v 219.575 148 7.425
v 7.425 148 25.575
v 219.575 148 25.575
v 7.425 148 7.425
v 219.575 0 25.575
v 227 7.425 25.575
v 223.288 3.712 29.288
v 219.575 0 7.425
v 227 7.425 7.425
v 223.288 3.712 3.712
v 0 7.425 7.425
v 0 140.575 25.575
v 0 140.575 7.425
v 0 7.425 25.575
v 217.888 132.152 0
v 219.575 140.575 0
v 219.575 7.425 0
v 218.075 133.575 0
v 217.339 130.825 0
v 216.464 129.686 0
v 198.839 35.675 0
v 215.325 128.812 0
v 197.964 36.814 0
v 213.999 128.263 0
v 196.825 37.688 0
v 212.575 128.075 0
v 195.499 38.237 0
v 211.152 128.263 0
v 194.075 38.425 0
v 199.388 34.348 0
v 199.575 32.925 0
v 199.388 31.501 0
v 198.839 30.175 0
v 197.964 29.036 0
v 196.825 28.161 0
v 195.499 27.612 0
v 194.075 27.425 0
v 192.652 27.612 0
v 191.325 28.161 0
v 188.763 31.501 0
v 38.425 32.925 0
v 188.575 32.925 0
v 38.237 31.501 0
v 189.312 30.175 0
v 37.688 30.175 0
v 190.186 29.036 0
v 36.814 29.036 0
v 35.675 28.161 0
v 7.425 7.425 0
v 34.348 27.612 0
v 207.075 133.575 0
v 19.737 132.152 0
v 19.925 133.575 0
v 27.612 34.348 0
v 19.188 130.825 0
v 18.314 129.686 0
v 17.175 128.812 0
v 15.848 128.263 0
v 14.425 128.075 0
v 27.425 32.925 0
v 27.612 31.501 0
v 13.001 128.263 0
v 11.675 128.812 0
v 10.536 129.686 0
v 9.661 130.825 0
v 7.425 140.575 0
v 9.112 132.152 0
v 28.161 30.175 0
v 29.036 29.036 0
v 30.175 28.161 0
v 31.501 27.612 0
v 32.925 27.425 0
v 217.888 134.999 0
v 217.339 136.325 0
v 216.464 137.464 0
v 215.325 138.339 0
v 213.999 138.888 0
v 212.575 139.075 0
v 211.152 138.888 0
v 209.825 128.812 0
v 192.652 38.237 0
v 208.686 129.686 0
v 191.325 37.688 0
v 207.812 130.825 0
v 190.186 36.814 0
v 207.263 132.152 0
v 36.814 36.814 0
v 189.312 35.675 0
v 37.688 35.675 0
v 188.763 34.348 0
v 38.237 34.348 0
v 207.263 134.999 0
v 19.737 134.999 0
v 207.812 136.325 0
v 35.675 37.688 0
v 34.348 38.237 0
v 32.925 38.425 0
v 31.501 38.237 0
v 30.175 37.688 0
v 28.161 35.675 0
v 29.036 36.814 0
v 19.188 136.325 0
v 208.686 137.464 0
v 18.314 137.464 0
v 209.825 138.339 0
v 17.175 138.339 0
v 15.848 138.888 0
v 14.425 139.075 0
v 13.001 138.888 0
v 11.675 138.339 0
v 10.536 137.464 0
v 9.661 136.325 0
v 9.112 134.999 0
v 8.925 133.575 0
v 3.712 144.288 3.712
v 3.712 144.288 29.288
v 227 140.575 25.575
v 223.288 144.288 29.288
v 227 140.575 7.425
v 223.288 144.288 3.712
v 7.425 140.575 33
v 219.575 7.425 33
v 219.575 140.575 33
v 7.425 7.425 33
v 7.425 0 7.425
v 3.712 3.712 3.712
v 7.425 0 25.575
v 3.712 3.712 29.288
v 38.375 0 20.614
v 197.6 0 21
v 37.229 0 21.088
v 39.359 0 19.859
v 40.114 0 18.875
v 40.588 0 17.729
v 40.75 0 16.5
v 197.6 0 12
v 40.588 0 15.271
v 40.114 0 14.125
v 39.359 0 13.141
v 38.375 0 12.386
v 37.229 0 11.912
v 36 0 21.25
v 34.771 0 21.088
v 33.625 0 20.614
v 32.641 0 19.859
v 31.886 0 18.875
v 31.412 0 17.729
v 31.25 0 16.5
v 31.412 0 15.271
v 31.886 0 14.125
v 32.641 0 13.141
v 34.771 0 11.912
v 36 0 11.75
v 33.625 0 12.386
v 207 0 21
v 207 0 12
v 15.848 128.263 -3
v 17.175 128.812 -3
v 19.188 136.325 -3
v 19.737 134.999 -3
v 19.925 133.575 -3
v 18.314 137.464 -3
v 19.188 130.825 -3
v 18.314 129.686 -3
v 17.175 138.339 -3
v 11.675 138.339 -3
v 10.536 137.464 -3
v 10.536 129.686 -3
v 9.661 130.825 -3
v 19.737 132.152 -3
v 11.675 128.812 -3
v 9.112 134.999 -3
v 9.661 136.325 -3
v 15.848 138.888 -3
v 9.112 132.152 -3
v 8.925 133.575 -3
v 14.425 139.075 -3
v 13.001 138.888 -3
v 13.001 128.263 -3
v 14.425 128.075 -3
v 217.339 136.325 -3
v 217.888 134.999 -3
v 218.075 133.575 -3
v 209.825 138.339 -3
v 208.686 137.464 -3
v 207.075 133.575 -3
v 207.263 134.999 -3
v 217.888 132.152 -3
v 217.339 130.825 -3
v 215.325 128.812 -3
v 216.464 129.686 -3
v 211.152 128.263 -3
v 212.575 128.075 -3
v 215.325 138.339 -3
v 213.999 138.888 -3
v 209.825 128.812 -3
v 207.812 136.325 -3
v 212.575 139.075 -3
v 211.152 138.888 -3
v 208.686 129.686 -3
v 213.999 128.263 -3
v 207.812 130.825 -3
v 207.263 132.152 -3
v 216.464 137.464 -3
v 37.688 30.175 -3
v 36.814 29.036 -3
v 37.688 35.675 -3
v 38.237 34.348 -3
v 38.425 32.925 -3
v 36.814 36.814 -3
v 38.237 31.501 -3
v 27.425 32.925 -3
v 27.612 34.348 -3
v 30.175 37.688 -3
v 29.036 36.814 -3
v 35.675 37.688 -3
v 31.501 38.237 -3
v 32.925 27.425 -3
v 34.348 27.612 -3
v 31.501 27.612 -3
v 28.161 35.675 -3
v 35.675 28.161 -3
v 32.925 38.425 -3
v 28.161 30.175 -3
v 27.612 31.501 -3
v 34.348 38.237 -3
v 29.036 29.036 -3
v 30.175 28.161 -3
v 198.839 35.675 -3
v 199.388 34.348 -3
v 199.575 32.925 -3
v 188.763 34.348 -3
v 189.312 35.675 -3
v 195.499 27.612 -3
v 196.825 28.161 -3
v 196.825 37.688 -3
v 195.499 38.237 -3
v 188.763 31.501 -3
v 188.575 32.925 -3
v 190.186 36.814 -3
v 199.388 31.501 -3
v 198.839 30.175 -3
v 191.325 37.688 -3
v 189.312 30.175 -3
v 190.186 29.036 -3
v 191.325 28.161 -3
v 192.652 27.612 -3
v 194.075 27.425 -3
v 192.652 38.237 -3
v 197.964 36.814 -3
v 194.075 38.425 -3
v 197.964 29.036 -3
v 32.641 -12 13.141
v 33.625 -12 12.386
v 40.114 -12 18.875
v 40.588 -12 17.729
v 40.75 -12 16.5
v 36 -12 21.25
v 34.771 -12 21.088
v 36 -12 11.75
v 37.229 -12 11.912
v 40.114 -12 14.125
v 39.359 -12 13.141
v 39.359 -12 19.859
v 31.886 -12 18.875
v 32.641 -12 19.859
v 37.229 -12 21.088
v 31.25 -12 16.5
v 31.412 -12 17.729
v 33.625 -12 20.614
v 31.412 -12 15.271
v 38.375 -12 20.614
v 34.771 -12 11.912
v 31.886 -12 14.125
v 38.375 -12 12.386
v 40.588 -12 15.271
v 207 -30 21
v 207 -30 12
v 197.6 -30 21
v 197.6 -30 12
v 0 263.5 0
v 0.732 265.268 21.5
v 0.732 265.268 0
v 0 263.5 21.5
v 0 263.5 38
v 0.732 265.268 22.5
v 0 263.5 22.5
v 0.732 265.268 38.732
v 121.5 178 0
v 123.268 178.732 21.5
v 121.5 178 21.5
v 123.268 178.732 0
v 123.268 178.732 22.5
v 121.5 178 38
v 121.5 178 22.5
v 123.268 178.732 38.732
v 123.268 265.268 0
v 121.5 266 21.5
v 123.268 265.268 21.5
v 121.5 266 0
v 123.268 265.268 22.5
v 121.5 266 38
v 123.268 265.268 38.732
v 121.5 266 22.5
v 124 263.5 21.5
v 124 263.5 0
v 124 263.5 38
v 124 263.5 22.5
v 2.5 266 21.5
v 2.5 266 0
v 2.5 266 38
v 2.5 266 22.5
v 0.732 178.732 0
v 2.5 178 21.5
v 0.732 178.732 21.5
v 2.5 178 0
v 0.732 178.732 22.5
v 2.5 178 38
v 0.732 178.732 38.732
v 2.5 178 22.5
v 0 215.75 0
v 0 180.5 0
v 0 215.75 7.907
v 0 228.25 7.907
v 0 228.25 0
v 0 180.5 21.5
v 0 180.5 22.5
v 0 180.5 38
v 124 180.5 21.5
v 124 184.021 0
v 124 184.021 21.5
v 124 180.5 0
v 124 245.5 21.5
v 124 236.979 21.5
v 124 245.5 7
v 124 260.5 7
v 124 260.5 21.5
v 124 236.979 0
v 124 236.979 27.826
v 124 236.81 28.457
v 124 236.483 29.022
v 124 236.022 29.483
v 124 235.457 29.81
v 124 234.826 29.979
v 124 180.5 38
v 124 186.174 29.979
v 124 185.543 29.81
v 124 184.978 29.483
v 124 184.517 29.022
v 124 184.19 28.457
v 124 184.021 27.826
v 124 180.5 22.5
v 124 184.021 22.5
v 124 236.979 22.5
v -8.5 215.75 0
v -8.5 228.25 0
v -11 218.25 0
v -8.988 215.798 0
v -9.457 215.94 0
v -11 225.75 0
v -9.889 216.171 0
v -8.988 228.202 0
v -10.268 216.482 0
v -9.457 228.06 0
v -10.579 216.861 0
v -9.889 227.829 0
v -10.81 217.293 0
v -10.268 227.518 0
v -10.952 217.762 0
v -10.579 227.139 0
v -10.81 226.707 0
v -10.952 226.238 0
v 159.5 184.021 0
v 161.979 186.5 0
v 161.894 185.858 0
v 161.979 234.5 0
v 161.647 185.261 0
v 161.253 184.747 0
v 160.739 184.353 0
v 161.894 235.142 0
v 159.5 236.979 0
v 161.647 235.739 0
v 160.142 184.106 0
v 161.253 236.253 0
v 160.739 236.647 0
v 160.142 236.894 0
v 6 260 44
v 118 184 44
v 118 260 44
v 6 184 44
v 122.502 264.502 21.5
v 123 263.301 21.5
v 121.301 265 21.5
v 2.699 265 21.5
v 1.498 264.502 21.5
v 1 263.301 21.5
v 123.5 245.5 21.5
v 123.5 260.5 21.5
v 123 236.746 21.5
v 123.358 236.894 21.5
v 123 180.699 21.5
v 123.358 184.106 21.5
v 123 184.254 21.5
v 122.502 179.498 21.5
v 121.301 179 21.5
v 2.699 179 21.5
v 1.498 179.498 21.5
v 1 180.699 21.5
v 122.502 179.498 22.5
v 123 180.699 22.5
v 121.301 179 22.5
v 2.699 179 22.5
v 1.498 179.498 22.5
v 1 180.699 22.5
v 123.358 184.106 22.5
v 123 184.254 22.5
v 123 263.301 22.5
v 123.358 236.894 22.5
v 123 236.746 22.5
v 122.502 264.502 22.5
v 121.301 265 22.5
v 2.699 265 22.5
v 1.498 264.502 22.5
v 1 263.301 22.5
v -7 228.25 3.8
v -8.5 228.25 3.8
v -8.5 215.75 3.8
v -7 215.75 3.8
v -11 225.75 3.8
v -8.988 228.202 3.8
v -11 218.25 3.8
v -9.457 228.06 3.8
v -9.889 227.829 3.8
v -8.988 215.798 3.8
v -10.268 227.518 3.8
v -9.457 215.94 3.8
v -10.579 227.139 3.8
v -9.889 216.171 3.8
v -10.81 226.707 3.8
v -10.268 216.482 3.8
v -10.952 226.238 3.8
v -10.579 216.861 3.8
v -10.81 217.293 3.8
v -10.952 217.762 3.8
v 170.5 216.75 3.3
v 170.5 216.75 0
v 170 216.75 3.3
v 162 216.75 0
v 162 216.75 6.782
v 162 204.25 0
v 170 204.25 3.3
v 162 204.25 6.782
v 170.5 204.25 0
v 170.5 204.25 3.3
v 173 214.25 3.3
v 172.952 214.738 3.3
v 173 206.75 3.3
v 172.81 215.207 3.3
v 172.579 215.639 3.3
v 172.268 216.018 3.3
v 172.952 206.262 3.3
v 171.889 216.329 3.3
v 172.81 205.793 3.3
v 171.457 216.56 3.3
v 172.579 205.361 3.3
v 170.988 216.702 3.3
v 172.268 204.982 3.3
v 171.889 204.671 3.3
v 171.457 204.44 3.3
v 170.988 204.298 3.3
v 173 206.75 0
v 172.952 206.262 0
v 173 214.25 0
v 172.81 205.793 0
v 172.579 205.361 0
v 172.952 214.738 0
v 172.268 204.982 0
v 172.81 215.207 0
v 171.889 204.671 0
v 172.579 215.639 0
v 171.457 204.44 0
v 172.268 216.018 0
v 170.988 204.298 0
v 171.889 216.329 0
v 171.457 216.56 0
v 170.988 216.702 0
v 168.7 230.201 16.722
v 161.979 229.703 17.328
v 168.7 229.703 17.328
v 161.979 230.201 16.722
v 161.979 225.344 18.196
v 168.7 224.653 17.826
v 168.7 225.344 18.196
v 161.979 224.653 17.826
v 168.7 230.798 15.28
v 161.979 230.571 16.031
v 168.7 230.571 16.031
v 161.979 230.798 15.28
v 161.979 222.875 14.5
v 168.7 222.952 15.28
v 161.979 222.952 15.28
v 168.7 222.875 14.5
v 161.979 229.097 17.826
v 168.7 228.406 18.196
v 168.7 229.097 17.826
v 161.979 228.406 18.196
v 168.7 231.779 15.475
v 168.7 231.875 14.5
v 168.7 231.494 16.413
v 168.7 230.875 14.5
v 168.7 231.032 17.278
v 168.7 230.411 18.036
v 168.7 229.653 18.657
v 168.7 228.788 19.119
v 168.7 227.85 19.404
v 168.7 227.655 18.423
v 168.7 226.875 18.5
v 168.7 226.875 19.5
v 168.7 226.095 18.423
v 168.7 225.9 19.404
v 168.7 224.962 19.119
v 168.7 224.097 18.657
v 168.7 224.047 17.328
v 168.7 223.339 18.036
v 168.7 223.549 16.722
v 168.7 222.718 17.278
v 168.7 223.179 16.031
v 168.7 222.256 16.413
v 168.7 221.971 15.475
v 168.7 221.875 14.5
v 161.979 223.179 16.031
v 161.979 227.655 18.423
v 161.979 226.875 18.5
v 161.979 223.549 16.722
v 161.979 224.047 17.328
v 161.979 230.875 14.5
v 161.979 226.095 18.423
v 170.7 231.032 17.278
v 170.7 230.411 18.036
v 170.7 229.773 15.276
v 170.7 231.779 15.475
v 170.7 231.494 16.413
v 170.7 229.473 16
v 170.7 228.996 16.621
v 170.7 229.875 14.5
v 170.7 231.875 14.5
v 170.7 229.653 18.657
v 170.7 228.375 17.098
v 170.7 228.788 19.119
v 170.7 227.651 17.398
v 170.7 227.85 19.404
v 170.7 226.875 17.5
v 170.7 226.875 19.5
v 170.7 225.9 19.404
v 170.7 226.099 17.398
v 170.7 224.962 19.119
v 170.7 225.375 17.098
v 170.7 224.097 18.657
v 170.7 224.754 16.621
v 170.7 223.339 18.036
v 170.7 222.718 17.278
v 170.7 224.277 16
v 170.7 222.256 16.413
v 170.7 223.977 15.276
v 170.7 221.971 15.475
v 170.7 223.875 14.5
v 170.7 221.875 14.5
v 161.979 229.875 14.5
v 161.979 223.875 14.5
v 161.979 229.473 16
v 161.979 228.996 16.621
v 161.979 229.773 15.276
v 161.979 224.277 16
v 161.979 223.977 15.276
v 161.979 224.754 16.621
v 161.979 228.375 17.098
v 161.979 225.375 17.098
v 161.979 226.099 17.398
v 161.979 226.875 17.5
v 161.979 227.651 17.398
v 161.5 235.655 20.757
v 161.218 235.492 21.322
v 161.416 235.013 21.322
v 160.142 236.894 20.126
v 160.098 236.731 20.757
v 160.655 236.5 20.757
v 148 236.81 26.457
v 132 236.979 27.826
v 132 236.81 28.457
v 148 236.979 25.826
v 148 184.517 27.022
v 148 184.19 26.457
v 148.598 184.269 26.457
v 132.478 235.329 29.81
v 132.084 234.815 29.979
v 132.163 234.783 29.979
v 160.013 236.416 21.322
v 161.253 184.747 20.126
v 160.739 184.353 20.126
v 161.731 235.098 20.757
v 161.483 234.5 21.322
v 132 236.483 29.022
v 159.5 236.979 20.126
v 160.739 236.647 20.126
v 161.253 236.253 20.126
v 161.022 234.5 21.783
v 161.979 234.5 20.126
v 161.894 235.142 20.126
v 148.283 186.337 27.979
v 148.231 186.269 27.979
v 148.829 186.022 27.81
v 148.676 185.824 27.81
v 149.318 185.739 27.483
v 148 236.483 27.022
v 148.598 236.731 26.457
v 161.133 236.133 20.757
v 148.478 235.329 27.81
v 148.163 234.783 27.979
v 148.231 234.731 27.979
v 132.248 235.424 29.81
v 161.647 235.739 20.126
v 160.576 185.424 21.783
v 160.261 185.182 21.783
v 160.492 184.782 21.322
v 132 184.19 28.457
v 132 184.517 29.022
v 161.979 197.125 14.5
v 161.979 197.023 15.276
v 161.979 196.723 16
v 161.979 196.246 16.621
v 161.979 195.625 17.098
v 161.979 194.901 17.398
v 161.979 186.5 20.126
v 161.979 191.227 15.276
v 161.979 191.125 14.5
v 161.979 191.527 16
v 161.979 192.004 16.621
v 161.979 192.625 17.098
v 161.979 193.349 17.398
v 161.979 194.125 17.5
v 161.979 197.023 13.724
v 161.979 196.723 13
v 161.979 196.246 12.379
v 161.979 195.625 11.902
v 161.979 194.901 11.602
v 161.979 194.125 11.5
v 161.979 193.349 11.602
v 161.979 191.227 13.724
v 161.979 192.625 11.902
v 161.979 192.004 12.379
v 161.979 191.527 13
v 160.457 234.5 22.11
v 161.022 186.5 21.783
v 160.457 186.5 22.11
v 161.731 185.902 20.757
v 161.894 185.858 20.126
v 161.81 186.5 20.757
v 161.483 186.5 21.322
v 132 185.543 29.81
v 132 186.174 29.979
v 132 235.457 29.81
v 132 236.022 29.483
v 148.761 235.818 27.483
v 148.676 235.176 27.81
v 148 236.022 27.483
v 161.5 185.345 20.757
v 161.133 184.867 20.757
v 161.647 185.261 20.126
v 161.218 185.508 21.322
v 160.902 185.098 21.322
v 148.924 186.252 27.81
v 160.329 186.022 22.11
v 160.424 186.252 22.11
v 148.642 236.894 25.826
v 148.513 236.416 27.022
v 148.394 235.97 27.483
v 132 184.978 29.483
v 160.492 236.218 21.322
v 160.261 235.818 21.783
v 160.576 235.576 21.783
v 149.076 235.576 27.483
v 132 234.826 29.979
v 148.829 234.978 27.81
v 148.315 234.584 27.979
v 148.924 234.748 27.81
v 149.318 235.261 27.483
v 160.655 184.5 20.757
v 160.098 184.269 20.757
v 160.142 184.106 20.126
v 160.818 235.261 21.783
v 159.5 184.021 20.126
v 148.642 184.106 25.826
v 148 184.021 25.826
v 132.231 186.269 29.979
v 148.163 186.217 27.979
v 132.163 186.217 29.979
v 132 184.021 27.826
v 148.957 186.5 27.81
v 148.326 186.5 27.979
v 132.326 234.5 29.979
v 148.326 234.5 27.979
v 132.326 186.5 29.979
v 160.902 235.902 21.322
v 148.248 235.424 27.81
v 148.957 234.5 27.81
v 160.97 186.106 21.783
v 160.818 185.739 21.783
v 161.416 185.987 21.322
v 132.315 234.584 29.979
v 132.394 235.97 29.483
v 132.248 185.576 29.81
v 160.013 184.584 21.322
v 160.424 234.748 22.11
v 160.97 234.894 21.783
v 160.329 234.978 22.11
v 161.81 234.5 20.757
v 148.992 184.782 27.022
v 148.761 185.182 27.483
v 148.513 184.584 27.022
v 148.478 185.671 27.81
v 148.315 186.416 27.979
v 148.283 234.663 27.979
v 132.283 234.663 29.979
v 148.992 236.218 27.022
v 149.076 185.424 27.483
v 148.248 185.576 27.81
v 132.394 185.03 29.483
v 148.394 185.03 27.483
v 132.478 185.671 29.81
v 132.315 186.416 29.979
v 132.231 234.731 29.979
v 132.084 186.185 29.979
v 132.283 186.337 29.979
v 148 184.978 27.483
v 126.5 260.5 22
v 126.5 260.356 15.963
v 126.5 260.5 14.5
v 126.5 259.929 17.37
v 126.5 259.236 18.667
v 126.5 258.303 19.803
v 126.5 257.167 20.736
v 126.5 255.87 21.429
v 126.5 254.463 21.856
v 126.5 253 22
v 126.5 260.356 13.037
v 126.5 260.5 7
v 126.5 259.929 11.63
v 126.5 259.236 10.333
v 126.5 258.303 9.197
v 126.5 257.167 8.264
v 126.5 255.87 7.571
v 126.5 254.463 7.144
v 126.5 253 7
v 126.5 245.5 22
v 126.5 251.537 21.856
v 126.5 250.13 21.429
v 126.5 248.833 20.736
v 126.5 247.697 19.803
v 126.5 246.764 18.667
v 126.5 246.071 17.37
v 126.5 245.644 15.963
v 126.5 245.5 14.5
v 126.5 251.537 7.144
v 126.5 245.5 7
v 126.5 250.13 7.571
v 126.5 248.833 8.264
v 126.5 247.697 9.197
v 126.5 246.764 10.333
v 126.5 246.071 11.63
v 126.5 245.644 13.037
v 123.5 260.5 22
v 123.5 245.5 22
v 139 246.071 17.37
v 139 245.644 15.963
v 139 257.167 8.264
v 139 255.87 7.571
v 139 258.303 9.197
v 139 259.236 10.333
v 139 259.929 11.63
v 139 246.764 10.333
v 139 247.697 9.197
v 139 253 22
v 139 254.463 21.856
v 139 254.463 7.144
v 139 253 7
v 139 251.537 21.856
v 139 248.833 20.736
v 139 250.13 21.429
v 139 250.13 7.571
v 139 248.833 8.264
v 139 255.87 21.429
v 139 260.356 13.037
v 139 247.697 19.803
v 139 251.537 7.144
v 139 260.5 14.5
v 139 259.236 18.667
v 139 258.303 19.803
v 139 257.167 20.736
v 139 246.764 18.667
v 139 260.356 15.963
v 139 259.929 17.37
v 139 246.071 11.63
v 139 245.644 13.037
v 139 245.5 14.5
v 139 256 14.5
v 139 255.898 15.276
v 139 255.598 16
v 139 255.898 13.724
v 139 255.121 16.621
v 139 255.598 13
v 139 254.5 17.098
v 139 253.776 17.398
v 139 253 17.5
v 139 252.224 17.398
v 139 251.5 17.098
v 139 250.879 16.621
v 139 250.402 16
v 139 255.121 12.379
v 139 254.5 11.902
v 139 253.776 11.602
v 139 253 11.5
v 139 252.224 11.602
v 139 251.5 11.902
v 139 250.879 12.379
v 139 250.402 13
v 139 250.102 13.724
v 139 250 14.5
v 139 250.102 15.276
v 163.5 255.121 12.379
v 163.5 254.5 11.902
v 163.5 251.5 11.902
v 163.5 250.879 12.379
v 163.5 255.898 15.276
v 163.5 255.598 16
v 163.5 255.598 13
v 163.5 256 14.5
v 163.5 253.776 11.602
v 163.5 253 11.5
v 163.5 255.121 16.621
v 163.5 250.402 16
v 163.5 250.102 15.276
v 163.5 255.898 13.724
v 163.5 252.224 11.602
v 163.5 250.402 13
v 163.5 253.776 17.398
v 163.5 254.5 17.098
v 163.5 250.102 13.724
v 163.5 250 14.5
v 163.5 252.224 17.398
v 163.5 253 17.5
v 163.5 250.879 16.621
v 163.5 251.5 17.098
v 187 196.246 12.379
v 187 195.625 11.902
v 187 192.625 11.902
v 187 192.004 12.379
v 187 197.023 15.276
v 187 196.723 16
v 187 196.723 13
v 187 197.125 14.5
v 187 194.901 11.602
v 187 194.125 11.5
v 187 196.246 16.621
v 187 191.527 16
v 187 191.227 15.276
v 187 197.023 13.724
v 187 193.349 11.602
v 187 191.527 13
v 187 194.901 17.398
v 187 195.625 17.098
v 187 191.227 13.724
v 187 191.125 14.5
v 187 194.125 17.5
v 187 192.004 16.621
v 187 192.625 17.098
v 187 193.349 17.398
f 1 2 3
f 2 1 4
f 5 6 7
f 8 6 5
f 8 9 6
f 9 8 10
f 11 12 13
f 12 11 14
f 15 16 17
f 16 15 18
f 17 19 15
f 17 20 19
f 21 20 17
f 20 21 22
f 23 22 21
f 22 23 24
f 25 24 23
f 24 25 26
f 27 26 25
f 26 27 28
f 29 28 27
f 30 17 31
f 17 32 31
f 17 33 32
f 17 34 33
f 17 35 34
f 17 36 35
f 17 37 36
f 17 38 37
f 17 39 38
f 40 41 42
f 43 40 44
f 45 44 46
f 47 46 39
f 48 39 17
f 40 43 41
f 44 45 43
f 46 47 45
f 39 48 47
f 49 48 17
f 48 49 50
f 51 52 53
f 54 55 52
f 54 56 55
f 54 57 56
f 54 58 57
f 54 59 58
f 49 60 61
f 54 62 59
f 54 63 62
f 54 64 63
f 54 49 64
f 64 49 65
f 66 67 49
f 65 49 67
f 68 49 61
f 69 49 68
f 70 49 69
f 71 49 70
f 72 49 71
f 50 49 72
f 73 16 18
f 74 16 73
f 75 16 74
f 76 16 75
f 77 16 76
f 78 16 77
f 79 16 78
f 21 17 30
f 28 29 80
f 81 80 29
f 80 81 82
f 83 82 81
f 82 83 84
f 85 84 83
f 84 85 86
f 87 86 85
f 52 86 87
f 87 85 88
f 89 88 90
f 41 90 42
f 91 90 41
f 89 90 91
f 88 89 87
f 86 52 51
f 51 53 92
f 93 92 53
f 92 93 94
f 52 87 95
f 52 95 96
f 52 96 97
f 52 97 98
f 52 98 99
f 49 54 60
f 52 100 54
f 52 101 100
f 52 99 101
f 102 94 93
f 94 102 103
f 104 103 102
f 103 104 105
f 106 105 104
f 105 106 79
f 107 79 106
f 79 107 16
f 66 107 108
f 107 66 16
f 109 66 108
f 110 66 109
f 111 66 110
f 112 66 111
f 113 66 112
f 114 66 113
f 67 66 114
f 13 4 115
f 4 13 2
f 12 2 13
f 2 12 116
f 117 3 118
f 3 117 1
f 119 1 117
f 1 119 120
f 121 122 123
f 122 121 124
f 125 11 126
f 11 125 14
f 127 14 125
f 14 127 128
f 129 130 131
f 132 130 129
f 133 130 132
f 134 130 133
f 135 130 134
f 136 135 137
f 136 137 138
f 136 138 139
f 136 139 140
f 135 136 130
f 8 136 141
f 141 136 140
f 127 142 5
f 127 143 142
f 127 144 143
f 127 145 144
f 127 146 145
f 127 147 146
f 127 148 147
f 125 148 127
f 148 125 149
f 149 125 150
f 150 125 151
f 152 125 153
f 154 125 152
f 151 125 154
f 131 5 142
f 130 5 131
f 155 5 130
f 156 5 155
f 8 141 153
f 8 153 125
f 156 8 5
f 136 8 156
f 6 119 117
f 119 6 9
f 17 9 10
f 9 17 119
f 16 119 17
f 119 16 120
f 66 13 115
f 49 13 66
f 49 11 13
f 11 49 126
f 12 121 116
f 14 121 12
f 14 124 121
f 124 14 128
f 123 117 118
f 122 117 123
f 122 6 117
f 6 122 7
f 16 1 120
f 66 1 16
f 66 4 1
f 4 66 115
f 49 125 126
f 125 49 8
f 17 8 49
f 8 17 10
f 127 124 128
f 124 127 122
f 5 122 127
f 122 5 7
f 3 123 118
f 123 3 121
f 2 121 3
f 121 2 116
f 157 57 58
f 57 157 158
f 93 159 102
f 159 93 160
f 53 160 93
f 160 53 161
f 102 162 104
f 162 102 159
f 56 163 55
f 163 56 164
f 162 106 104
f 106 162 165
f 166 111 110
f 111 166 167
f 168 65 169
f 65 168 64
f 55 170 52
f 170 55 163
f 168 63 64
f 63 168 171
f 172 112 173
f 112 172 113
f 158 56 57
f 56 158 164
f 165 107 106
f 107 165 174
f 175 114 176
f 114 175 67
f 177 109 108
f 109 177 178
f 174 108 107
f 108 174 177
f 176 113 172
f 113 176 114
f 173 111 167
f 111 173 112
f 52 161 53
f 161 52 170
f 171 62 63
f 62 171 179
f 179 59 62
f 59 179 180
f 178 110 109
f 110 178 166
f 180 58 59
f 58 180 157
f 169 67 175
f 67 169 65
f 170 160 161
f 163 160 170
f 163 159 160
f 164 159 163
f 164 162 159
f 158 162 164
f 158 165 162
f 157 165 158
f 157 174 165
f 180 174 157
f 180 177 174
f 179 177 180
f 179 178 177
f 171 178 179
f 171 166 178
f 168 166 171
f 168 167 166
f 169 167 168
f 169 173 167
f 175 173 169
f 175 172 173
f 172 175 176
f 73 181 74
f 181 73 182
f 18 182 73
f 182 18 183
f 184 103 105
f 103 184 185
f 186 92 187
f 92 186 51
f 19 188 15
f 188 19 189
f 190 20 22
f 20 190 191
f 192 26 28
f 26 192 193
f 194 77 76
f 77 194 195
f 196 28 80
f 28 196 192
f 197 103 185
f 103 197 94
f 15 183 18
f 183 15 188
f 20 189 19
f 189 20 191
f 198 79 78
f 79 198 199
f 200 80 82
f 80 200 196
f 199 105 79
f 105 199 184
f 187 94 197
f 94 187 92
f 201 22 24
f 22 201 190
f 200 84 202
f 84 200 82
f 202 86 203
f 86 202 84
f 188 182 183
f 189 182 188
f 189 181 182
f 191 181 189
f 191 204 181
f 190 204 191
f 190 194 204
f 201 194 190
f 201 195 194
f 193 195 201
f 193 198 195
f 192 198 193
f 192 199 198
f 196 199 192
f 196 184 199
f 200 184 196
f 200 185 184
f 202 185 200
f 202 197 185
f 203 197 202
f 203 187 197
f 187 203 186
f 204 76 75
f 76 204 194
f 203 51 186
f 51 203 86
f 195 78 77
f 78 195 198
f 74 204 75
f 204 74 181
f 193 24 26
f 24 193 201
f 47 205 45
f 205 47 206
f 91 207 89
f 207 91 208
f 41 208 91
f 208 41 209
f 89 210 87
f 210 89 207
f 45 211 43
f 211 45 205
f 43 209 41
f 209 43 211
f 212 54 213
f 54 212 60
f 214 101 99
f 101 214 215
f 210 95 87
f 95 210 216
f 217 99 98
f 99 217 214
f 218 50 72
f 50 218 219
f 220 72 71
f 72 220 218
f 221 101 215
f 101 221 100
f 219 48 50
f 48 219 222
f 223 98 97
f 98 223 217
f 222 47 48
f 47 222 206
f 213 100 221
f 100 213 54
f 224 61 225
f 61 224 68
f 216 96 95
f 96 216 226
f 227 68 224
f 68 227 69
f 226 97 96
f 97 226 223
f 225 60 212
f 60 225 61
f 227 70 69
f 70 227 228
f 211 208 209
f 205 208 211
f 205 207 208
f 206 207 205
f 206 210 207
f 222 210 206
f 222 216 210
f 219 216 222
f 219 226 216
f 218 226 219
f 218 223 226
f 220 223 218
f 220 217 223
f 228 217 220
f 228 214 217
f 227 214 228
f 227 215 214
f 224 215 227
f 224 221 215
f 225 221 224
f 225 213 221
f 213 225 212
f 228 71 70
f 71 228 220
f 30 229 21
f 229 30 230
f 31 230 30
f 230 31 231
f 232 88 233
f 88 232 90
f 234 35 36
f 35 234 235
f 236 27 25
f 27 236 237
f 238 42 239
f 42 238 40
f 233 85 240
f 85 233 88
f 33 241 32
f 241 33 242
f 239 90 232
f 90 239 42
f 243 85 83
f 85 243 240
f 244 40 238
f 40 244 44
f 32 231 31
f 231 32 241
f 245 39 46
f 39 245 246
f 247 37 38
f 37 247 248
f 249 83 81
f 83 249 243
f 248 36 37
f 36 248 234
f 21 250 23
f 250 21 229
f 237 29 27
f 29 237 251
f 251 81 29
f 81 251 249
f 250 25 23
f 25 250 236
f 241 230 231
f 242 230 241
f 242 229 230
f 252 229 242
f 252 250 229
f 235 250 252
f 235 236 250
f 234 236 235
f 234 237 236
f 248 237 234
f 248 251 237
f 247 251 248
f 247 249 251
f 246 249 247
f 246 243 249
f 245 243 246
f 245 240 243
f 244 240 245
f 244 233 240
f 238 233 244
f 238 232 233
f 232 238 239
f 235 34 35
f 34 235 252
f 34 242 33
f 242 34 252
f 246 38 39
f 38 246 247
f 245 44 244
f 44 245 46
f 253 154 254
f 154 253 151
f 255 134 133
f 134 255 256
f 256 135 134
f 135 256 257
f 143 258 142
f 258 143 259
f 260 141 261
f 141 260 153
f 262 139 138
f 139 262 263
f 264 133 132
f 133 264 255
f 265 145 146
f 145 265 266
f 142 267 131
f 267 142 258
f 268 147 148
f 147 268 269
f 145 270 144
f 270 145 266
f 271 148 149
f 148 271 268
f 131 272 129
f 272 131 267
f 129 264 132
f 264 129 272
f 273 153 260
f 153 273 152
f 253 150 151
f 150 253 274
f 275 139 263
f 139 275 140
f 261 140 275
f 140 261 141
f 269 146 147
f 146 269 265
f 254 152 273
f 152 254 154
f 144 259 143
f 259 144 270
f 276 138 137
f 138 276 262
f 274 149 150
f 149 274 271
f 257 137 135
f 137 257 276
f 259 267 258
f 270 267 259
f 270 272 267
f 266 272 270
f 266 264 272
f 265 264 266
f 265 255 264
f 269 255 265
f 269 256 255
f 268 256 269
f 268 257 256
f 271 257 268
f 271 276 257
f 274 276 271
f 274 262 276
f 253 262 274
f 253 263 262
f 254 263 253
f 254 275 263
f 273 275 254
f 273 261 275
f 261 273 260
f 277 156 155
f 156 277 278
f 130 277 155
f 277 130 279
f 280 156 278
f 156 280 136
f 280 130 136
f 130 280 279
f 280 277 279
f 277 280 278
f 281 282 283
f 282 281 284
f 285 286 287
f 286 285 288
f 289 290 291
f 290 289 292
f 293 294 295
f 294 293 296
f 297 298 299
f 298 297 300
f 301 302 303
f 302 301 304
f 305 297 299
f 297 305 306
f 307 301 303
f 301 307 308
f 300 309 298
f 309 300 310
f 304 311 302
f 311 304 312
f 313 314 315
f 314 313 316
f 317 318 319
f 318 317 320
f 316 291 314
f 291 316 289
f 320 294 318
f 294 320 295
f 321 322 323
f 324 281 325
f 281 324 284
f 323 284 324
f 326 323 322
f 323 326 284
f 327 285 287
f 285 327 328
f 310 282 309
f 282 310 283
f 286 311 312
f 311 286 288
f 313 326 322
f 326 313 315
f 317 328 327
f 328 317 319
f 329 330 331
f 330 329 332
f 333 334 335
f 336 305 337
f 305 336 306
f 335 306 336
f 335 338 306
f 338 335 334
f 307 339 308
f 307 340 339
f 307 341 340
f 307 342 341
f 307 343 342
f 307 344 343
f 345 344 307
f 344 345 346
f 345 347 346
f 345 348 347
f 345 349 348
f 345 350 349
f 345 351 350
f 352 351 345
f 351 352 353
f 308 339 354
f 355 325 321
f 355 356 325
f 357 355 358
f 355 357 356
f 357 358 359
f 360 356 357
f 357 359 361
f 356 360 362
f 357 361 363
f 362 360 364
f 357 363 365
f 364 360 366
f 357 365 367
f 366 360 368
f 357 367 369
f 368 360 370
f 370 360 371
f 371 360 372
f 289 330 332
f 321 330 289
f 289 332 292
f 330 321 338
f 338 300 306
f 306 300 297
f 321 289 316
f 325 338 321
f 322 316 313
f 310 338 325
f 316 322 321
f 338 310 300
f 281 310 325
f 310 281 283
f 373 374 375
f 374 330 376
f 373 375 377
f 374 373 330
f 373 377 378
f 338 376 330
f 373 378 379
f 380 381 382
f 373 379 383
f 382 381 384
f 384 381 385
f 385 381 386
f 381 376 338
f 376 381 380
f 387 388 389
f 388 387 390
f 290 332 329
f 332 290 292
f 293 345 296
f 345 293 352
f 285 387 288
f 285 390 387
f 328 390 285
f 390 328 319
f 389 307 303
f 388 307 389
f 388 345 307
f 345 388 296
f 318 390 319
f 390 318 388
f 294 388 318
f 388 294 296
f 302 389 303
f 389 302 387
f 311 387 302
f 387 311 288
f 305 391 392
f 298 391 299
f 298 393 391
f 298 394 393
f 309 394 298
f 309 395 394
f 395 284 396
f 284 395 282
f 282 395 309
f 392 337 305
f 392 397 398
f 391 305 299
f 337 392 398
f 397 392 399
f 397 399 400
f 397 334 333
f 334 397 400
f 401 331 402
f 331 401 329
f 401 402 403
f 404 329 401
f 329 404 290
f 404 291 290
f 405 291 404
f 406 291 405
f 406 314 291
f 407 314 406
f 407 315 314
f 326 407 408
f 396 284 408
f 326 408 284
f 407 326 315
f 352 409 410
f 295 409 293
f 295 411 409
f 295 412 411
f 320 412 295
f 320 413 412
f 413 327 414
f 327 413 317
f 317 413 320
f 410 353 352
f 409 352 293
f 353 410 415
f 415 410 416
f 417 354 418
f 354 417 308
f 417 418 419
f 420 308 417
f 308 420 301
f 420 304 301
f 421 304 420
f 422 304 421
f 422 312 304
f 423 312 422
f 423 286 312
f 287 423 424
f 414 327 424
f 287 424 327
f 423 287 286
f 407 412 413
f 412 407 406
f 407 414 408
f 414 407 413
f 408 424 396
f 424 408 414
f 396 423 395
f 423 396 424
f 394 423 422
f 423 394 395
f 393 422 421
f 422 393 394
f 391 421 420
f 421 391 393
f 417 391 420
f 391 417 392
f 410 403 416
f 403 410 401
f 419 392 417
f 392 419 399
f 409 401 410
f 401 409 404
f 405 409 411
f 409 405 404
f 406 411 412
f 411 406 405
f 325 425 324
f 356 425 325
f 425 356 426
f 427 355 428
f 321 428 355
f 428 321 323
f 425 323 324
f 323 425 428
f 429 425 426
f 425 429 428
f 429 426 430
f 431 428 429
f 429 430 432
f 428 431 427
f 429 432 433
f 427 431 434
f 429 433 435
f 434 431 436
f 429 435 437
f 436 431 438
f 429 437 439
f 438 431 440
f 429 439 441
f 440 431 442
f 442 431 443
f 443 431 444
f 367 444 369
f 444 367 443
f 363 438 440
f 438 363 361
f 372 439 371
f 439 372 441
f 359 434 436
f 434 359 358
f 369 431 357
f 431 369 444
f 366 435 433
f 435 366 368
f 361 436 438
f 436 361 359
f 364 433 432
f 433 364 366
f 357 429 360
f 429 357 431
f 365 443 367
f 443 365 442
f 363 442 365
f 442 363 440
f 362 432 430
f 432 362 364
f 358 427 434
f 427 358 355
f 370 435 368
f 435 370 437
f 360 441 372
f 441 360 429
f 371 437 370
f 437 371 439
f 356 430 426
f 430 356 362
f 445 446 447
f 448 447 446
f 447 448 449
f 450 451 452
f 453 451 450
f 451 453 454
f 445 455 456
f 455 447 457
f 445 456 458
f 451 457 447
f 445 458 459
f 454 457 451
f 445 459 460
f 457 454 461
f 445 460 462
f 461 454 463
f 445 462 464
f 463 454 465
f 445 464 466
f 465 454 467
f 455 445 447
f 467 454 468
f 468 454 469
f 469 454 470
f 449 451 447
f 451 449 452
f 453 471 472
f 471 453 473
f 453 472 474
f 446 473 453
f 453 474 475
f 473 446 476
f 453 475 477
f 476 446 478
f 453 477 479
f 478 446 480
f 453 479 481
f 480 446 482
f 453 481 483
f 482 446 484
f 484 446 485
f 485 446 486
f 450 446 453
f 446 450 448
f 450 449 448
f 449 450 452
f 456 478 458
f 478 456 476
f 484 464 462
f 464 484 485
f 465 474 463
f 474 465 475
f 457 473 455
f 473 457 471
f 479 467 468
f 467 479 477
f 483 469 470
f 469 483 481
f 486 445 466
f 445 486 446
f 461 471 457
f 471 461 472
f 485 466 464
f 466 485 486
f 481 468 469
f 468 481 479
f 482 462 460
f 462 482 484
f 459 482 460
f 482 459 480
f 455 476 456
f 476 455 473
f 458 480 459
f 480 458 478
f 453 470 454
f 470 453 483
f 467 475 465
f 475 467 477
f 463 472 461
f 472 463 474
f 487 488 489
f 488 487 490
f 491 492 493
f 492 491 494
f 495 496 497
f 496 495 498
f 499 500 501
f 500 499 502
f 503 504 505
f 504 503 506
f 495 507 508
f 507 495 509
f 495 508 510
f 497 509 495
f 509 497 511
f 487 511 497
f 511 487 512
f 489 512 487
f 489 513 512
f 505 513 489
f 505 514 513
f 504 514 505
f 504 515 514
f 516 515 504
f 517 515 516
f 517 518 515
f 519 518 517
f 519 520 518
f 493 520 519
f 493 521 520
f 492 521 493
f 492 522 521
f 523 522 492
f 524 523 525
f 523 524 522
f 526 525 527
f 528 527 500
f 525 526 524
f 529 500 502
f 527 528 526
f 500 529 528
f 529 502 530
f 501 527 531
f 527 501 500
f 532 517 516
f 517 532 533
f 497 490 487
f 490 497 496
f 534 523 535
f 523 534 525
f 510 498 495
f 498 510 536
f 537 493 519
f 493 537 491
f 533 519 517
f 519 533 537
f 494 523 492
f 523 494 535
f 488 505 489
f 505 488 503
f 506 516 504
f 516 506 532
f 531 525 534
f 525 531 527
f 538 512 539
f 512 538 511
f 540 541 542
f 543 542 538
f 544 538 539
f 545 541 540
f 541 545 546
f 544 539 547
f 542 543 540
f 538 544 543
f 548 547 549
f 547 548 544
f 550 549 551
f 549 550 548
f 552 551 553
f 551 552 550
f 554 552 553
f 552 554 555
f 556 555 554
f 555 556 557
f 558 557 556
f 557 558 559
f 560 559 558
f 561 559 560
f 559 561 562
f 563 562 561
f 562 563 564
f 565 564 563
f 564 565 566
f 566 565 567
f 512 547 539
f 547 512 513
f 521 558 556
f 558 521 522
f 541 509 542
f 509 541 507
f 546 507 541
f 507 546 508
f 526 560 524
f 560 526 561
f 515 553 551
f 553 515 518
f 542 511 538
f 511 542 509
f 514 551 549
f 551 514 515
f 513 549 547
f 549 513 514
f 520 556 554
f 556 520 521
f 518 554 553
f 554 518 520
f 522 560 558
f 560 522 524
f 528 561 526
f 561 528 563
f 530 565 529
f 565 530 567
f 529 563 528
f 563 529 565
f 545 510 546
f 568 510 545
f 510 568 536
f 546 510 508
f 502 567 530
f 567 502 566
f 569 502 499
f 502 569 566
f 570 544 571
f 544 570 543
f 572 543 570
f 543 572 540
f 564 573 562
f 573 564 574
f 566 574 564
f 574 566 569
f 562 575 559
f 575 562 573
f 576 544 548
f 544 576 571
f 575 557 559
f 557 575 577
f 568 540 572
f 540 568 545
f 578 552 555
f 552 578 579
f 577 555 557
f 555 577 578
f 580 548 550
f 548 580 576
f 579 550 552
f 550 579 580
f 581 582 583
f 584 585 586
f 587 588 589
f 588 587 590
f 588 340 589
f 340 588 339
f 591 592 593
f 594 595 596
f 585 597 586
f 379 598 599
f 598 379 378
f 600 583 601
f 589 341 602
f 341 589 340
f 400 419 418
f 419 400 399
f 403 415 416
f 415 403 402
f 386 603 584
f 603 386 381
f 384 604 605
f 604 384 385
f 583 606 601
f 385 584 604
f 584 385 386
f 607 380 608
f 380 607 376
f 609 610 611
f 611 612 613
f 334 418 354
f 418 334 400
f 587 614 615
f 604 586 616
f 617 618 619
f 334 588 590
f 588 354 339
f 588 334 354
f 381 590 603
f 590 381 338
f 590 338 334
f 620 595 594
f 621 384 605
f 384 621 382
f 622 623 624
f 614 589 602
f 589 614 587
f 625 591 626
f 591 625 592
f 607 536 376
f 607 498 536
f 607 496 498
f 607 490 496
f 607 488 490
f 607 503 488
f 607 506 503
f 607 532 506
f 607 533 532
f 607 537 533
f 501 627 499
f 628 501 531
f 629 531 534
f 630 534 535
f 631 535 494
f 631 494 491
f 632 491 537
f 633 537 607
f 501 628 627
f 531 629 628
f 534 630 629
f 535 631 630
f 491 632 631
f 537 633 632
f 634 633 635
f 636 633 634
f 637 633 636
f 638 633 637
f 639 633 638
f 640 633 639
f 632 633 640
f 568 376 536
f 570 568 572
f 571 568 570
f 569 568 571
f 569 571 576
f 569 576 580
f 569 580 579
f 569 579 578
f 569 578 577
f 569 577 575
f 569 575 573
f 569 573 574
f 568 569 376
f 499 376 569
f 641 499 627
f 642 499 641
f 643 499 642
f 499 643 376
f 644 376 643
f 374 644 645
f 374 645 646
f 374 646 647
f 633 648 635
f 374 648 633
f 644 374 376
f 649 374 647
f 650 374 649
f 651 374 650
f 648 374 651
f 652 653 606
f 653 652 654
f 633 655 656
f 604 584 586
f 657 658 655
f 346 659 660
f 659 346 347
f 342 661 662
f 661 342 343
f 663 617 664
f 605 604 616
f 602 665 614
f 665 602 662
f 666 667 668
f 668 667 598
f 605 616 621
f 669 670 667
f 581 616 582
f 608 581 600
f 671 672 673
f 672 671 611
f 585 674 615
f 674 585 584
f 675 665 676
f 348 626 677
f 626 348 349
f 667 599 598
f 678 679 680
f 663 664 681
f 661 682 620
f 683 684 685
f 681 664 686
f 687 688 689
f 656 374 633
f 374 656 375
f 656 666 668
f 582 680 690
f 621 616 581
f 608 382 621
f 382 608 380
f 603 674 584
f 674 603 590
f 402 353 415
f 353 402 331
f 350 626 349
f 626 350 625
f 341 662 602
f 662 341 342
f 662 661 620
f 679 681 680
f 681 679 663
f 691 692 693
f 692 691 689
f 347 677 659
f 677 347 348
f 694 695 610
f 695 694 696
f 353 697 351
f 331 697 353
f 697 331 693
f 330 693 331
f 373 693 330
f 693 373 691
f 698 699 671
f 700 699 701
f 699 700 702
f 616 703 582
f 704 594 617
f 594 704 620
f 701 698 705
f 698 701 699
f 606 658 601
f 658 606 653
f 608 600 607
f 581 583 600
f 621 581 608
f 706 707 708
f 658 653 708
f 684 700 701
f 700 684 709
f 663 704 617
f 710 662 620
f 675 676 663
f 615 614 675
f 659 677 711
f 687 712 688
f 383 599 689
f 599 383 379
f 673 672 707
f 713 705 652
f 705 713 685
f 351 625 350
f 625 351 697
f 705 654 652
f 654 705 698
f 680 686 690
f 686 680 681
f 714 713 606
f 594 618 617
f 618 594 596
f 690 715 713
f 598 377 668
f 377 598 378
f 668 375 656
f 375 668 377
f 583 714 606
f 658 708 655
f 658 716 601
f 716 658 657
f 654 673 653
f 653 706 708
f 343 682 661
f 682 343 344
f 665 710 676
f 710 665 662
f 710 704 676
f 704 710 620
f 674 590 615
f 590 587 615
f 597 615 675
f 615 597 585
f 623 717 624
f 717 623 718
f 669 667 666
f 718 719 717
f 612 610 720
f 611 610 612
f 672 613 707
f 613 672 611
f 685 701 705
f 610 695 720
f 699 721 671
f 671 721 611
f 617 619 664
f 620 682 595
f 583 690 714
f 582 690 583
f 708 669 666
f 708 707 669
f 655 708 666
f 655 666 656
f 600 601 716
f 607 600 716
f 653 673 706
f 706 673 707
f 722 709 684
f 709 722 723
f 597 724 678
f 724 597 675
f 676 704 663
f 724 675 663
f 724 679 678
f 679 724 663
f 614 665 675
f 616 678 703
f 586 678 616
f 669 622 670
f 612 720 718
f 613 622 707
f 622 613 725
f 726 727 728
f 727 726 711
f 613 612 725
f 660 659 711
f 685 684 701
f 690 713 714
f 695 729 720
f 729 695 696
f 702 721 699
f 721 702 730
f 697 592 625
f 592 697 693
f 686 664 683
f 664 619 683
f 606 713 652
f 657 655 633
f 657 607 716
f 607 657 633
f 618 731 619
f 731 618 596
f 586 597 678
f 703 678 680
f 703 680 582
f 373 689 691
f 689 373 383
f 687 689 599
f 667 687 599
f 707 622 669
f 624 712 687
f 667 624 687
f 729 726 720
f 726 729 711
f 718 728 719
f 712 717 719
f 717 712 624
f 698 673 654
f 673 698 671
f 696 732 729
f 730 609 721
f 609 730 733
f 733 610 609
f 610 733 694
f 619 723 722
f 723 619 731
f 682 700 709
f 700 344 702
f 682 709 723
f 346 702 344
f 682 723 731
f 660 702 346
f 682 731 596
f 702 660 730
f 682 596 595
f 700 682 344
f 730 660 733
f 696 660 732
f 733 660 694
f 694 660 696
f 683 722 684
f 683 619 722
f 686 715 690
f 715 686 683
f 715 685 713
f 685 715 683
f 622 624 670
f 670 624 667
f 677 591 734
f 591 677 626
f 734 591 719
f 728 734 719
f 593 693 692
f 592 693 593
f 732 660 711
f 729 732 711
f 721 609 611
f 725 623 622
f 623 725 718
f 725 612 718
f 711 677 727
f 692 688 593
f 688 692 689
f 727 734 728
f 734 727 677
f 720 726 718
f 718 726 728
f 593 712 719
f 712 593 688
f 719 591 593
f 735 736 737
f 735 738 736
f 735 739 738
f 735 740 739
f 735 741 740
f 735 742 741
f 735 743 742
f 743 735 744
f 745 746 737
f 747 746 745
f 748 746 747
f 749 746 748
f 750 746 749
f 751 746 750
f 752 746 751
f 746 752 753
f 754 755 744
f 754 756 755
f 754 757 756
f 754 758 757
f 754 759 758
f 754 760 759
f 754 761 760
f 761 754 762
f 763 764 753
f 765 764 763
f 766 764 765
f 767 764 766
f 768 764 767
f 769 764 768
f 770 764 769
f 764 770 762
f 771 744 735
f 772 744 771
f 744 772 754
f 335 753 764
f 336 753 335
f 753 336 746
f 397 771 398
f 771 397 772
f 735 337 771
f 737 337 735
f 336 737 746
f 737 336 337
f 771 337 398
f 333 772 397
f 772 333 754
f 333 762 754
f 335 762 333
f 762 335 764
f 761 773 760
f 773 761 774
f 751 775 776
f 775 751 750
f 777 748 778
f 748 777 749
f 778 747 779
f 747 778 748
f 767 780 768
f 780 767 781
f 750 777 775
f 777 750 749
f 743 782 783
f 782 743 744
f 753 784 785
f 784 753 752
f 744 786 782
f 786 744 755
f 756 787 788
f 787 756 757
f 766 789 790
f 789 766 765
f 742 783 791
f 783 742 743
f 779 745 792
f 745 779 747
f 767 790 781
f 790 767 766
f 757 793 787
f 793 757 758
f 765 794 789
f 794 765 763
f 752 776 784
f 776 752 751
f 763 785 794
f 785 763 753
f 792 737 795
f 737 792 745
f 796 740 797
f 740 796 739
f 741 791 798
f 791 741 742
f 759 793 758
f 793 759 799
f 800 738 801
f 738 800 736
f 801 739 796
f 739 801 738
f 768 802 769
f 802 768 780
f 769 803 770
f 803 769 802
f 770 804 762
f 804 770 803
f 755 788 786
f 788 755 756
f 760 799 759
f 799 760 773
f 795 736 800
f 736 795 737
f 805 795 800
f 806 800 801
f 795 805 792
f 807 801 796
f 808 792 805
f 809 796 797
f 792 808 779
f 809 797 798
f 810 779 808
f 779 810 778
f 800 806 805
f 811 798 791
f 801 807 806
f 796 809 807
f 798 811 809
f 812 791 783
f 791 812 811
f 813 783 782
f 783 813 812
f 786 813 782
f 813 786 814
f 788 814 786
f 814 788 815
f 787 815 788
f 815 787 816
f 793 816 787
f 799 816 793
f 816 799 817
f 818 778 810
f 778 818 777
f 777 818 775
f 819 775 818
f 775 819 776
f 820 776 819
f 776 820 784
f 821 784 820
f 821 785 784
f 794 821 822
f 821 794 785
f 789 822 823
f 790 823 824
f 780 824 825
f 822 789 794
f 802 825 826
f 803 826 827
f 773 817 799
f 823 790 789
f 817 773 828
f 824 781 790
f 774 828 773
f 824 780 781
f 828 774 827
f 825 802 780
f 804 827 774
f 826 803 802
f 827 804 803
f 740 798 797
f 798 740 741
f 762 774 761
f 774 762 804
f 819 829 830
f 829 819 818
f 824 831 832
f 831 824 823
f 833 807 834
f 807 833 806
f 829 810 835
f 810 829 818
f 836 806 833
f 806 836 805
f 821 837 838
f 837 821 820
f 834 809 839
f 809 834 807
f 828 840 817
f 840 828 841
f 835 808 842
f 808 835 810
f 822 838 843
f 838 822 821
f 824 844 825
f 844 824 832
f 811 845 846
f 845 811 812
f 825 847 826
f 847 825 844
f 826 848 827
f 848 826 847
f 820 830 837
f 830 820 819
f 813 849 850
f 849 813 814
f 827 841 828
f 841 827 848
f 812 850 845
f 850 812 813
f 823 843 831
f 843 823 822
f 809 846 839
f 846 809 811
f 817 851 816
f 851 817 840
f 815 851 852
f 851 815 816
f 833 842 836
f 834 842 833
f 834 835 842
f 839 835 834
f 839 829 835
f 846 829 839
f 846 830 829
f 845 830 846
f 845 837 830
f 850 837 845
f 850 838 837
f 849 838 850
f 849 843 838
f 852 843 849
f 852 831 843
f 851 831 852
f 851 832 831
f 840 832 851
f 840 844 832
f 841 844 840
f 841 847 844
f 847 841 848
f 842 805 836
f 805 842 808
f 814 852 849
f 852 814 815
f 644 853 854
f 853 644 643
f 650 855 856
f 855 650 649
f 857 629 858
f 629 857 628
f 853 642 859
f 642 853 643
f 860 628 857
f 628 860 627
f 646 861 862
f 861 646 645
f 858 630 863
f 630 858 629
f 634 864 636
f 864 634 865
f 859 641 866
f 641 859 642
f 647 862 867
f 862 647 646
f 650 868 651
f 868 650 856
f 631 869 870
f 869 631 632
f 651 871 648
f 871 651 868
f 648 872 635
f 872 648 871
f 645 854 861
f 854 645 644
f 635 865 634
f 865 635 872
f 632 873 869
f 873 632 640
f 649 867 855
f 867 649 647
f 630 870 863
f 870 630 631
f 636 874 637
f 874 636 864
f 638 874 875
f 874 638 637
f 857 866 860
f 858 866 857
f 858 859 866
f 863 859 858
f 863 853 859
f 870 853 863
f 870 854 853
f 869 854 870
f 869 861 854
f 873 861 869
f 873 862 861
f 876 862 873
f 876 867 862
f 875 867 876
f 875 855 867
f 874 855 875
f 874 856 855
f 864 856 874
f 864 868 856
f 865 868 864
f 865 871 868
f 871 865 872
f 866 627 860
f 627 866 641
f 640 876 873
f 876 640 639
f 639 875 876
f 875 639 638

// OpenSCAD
// Verizon I-211M-L ONT + inline power brick — reference solids
// All primary dims calipers, 2026-08-08.
// Axes: x = along the rack face, y = depth, z = up; devices lying flat.
// Origin: bottom-left-front corner of each body's bounding box.

// Octagonal profile: w x h rectangle with corners cut c.
// bottom=false leaves the two bottom corners sharp.
function _prof(w, h, c, bottom = true) = bottom
    ? [[c, 0], [w - c, 0], [w, c], [w, h - c], [w - c, h], [c, h], [0, h - c], [0, c]]
    : [[0, 0], [w, 0], [w, h - c], [w - c, h], [c, h], [0, h - c]];

// Box with 45-degree chamfer c on edges.
// bottom=false: edges of the bottom face stay sharp (vertical edges still cut).
module chamfered_box(x, y, z, c, bottom = true) {
    intersection() {
        linear_extrude(z)                            // vertical edges
            polygon(_prof(x, y, c));
        translate([0, y, 0]) rotate([90, 0, 0])      // edges running along y
            linear_extrude(y) polygon(_prof(x, z, c, bottom));
        rotate([90, 0, 90])                          // edges running along x
            linear_extrude(x) polygon(_prof(y, z, c, bottom));
    }
}

// ---------------- ONT ----------------
ont_l = 227;          // x, soft tape +-2
ont_w = 148;          // y, calipers
ont_h = 33;           // z, calipers
ont_chamfer_face = 10.5;              // calipers, width of the 45° chamfer FACE,
ont_chamfer = ont_chamfer_face / sqrt(2);  // -> ~7.4 leg; ALL edges incl. LED bevel

// Connector edge = one long (x) edge -> faces rack rear.
// LED bevel = opposite long edge -> faces rack front (model y = ont_w edge).

// Rubber feet on the bottom face (calipers except inset depth). There are
// also mounting bosses on the bottom, shorter than the feet — unmeasured;
// the ONT rides on its feet so bosses just need to hover.
foot_d = 11;
foot_h = 3;
// Foot gaps are measured from the CHAMFER edge (where the corner cut meets
// the side), and each pair's gap applies on BOTH axes from its corner.
foot_gap_led = 1.5;    // LED-side pair
foot_gap_port = 20;    // port-side pair
f_led  = ont_chamfer + foot_gap_led  + foot_d / 2;   // center from corner
f_port = ont_chamfer + foot_gap_port + foot_d / 2;

ont_feet = [
    [f_led,          ont_w - f_led],
    [ont_l - f_led,  ont_w - f_led],
    [f_port,         f_port],
    [ont_l - f_port, f_port],
];

// Rear-face ports, centered in z on the connector face (y=0). Positions
// calipers; stub sizes estimated. Modeled as protruding stubs so mount
// keep-outs and cable sweep are visible on the ghost.
coax_x = 36;                 // F-connector center to the -x face
coax_d = 9.5;
coax_len = 12;
fiber_edge_x = ont_l - 20;   // green SC/APC plug outer edge to the +x face
fiber_w = 9.4;
fiber_h = 9;
fiber_len = 30;              // connector body + start of boot

module ont() {
    chamfered_box(ont_l, ont_w, ont_h, ont_chamfer);
    for (p = ont_feet)
        translate([p[0], p[1], -foot_h])
            cylinder(h = foot_h + 0.5, d = foot_d, $fn = 24);
    // port stubs on the connector face
    translate([coax_x, 0.5, ont_h / 2]) rotate([90, 0, 0])
        cylinder(h = coax_len + 0.5, d = coax_d, $fn = 24);
    translate([fiber_edge_x - fiber_w, -fiber_len, (ont_h - fiber_h) / 2])
        cube([fiber_w, fiber_len + 0.5, fiber_h]);
}

// ---------------- Power brick ----------------
// Calipers except where noted. Envelope quirk: sides bow out ("diamond") —
// widest ~1.2 mm proud of the chamfer edge at mid-height (rough measurement).
// 124 x 88 are max-envelope caliper numbers, so pockets sized off these are
// safe; the body is just a touch slimmer near top and bottom.
brick_l = 124;        // x
brick_w = 88;         // y
brick_h = 44;         // z
brick_chamfer = 6;    // top-face perimeter only
brick_corner_r = 2.5; // vertical edges "lightly rounded" — eyeball value

// shell parting line: groove around the body at the z-center plane where the
// two plastic shell halves mate
seam_h = 1;           // z height of the groove
seam_d = 1;           // how deep it cuts into the x/y faces

// Mounting tabs on BOTH x ends: bottom-flush wedges, thick at the body,
// sloping down to a FLAT RUN at min height out to the tip.
tab_len = 11;         // x, how far each sticks out
tab_w = 12.5;         // y
tab_r = 2.5;          // outer vertical edges "moderately rounded" — eyeball
tabm_h_min = 3.8;  tabm_h_max = 8.2;  tabm_flat = 4;   // -x tab
tabp_h_min = 3.3;  tabp_h_max = 7.0;  tabp_flat = 3;   // +x tab

// plan footprint of a tab, tip corners rounded; tip at x=0, or at x=tab_len
// with tip_right=true (built directly, not mirror()ed — mirrored 2D reverses
// winding and CGAL rejects the extruded intersection as non-closed)
module _tab_plan(tip_right = false) {
    cx = tip_right ? tab_len - tab_r : tab_r;
    hull() {
        translate([tip_right ? 0 : tab_len - 1, 0]) square([1, tab_w]);
        translate([cx, tab_r]) circle(tab_r, $fn = 32);
        translate([cx, tab_w - tab_r]) circle(tab_r, $fn = 32);
    }
}

// Cord-exit protrusion on the +x end (soft tape). Modeled as its full
// envelope box — the taper is ignored on purpose, pockets must clear it anyway.
// ---- cord shroud (+x end) ----
// TWO cords exit the +x end (stub cylinders below — leave the whole +x face
// open in the mount):
//   1. body cord, toward the +y edge of the body's +x face
//   2. output cord, locked in by the cord shroud (strain relief), leaving the
//      shroud's tip face on the -y side of the +x tab
// The +x tab hangs off the FAR (+x) END of the shroud, bottom-flush, centered
// on the shroud's y span. A small cylindrical greeble sits on the +y side of
// the tab on the same face.
shroud_len = 38;      // x beyond the body
shroud_y0 = 6;        // margin from the -y edge (calipers)
shroud_w = 53;        // y
shroud_drop = 14;     // its flat top sits this far below the brick top
shroud_h_tip = 22.3;  // height of the tip face (calipers)
shroud_h_root = brick_h - shroud_drop;
shroud_r = 2.5;       // all edges moderately rounded EXCEPT the floor
tabp_y = shroud_y0 + (shroud_w - tab_w) / 2;   // +x tab centered on the shroud

// Cords Ø6 (calipers). y of the body cord still TODO calipers.
cord_d = 6;
cord_stub = 25;                      // how far bare-cord stubs poke out

// Body cord strain relief: stacked in +x off the body face — rect slab, then
// cylinder, then the cord. Max z extent of the relief = brick_h/2 (calipers).
srA_rect_x = 2.5;                    // slab thickness in x
srA_wh = 15;                         // slab is 15 x 15 in y/z; cylinder Ø15
srA_cyl_len = 12.5;
srA_top = brick_h / 2;               // top of the whole relief stack
cordA_y = brick_w - 10 - cord_d / 2; // TODO calipers — "a bit more -y" than 6
cordA_z = srA_top - srA_wh / 2;      // relief + cord centerline (14.5)

// Shroud cord: top of cord 4.8 (calipers) below the tip face's max z
cordB_y = (shroud_y0 + tabp_y) / 2;  // -y side of the tab
cordB_z = shroud_h_tip - 4.8 - cord_d / 2;

// greeble on the +y side of the tab: an unpopulated cord exit ("cord hat").
// Half-spool, its y and z mirroring the shroud cord across the tab: shaft
// then lip stacked in +x, center drilled out Ø6 (cord-sized), then cut at
// the axis z-plane — flat below, half-round above. All calipers.
greeble_shaft_len = 6.7;  greeble_shaft_d = 8;
greeble_lip_len = 2;      greeble_lip_d = 10;
greeble_y = (tabp_y + tab_w + shroud_y0 + shroud_w) / 2;  // cordB_y mirrored
greeble_z = shroud_h_tip - 4.8 - cord_d / 2;              // = cordB_z

module brick() {
    // body: rounded vertical edges, 45° chamfer around the top face only,
    // shell parting-line groove at the z-center plane
    difference() {
        intersection() {
            linear_extrude(brick_h)
                offset(r = brick_corner_r) offset(delta = -brick_corner_r)
                    square([brick_l, brick_w]);
            translate([0, brick_w, 0]) rotate([90, 0, 0])
                linear_extrude(brick_w) polygon(_prof(brick_l, brick_h, brick_chamfer, false));
            rotate([90, 0, 90])
                linear_extrude(brick_l) polygon(_prof(brick_w, brick_h, brick_chamfer, false));
        }
        // convexity hint stops the F5 see-through artifact on this groove
        translate([0, 0, brick_h / 2 - seam_h / 2])
            linear_extrude(seam_h, convexity = 10) difference() {
                offset(delta = 1)  // overshoot outward to dodge coplanar faces
                    offset(r = brick_corner_r) offset(delta = -brick_corner_r)
                        square([brick_l, brick_w]);
                offset(delta = -seam_d)
                    offset(r = brick_corner_r) offset(delta = -brick_corner_r)
                        square([brick_l, brick_w]);
            }
    }
    // Tab profiles overshoot the plan footprint by 0.5 on both x ends so the
    // rounded _tab_plan governs the tip cleanly (avoids coincident-face CGAL
    // errors); the body-side overshoot is swallowed by the union.
    // -x tab: x=0 at tip; flat run at h_min from the tip, then slope up to
    // h_max at the body
    translate([-tab_len, (brick_w - tab_w) / 2, 0]) intersection() {
        translate([0, tab_w, 0]) rotate([90, 0, 0]) linear_extrude(tab_w)
            polygon([[-0.5, 0], [tab_len + 0.5, 0], [tab_len + 0.5, tabm_h_max],
                     [tabm_flat, tabm_h_min], [-0.5, tabm_h_min]]);
        translate([0, 0, -0.5]) linear_extrude(tabm_h_max + 1.5) _tab_plan();
    }
    // +x tab: hangs off the far end of the cord shroud. x=0 at the tip face;
    // slope down from h_max to a flat run at h_min ending at the tip
    translate([brick_l + shroud_len, tabp_y, 0]) intersection() {
        translate([0, tab_w, 0]) rotate([90, 0, 0]) linear_extrude(tab_w)
            polygon([[-0.5, 0], [tab_len + 0.5, 0], [tab_len + 0.5, tabp_h_min],
                     [tab_len - tabp_flat, tabp_h_min], [-0.5, tabp_h_max]]);
        translate([0, 0, -0.5]) linear_extrude(tabp_h_max + 1.5)
            _tab_plan(tip_right = true);
    }
    // cord shroud: flush with the bottom, 6 mm off the -y edge. Side profile
    // traced 2026-08-08: flat top at root height, knee curving down to the
    // 22.3-tall tip face (knee polyline is a conservative estimate).
    // Rounding: minkowski with a TOP-half sphere rounds every edge r2.5
    // except the floor perimeter, and keeps the floor itself flat. The
    // operand profile is shrunk by r on each affected side; the root end
    // overshoots into the body, which the union swallows.
    minkowski() {
        translate([brick_l, shroud_y0 + shroud_w - shroud_r, 0]) rotate([90, 0, 0])
            linear_extrude(shroud_w - 2 * shroud_r) polygon([
                [0, 0], [shroud_len - shroud_r, 0],
                [shroud_len - shroud_r, shroud_h_tip - shroud_r],
                [shroud_len - 14, shroud_h_root - 2 - shroud_r],
                [8, shroud_h_root - shroud_r], [0, shroud_h_root - shroud_r],
            ]);
        intersection() {
            sphere(shroud_r, $fn = 24);
            translate([-shroud_r, -shroud_r, 0])
                cube([2 * shroud_r, 2 * shroud_r, shroud_r]);
        }
    }
    // body cord strain relief stack: slab -> cylinder -> cord
    translate([brick_l - 0.5, cordA_y - srA_wh / 2, srA_top - srA_wh])
        cube([srA_rect_x + 0.5, srA_wh, srA_wh]);
    translate([brick_l + srA_rect_x - 0.5, cordA_y, cordA_z]) rotate([0, 90, 0])
        cylinder(h = srA_cyl_len + 0.5, d = srA_wh, $fn = 32);
    translate([brick_l + srA_rect_x + srA_cyl_len - 0.5, cordA_y, cordA_z])
        rotate([0, 90, 0]) cylinder(h = cord_stub, d = cord_d, $fn = 24);
    // shroud (output) cord
    translate([brick_l + shroud_len - 1, cordB_y, cordB_z]) rotate([0, 90, 0])
        cylinder(h = cord_stub + 1, d = cord_d, $fn = 24);
    // greeble on the tip face, +y of the tab: hollow cord hat, flat below
    // the axis plane
    translate([brick_l + shroud_len - 0.5, greeble_y, greeble_z]) difference() {
        intersection() {
            rotate([0, 90, 0]) {
                cylinder(h = greeble_shaft_len + 0.5, d = greeble_shaft_d, $fn = 32);
                translate([0, 0, greeble_shaft_len + 0.5])
                    cylinder(h = greeble_lip_len, d = greeble_lip_d, $fn = 32);
            }
            translate([-1, -greeble_lip_d, 0])
                cube([greeble_shaft_len + greeble_lip_len + 2, greeble_lip_d * 2, greeble_lip_d]);
        }
        rotate([0, 90, 0]) translate([0, 0, -1])
            cylinder(h = greeble_shaft_len + greeble_lip_len + 2.5, d = cord_d, $fn = 24);
    }
}

// ---------------- preview ----------------
// Included files render this too unless they set show_devices = false.
show_devices = true;
if (show_devices) {
    ont();
    translate([0, ont_w + 30, 0]) brick();
}
